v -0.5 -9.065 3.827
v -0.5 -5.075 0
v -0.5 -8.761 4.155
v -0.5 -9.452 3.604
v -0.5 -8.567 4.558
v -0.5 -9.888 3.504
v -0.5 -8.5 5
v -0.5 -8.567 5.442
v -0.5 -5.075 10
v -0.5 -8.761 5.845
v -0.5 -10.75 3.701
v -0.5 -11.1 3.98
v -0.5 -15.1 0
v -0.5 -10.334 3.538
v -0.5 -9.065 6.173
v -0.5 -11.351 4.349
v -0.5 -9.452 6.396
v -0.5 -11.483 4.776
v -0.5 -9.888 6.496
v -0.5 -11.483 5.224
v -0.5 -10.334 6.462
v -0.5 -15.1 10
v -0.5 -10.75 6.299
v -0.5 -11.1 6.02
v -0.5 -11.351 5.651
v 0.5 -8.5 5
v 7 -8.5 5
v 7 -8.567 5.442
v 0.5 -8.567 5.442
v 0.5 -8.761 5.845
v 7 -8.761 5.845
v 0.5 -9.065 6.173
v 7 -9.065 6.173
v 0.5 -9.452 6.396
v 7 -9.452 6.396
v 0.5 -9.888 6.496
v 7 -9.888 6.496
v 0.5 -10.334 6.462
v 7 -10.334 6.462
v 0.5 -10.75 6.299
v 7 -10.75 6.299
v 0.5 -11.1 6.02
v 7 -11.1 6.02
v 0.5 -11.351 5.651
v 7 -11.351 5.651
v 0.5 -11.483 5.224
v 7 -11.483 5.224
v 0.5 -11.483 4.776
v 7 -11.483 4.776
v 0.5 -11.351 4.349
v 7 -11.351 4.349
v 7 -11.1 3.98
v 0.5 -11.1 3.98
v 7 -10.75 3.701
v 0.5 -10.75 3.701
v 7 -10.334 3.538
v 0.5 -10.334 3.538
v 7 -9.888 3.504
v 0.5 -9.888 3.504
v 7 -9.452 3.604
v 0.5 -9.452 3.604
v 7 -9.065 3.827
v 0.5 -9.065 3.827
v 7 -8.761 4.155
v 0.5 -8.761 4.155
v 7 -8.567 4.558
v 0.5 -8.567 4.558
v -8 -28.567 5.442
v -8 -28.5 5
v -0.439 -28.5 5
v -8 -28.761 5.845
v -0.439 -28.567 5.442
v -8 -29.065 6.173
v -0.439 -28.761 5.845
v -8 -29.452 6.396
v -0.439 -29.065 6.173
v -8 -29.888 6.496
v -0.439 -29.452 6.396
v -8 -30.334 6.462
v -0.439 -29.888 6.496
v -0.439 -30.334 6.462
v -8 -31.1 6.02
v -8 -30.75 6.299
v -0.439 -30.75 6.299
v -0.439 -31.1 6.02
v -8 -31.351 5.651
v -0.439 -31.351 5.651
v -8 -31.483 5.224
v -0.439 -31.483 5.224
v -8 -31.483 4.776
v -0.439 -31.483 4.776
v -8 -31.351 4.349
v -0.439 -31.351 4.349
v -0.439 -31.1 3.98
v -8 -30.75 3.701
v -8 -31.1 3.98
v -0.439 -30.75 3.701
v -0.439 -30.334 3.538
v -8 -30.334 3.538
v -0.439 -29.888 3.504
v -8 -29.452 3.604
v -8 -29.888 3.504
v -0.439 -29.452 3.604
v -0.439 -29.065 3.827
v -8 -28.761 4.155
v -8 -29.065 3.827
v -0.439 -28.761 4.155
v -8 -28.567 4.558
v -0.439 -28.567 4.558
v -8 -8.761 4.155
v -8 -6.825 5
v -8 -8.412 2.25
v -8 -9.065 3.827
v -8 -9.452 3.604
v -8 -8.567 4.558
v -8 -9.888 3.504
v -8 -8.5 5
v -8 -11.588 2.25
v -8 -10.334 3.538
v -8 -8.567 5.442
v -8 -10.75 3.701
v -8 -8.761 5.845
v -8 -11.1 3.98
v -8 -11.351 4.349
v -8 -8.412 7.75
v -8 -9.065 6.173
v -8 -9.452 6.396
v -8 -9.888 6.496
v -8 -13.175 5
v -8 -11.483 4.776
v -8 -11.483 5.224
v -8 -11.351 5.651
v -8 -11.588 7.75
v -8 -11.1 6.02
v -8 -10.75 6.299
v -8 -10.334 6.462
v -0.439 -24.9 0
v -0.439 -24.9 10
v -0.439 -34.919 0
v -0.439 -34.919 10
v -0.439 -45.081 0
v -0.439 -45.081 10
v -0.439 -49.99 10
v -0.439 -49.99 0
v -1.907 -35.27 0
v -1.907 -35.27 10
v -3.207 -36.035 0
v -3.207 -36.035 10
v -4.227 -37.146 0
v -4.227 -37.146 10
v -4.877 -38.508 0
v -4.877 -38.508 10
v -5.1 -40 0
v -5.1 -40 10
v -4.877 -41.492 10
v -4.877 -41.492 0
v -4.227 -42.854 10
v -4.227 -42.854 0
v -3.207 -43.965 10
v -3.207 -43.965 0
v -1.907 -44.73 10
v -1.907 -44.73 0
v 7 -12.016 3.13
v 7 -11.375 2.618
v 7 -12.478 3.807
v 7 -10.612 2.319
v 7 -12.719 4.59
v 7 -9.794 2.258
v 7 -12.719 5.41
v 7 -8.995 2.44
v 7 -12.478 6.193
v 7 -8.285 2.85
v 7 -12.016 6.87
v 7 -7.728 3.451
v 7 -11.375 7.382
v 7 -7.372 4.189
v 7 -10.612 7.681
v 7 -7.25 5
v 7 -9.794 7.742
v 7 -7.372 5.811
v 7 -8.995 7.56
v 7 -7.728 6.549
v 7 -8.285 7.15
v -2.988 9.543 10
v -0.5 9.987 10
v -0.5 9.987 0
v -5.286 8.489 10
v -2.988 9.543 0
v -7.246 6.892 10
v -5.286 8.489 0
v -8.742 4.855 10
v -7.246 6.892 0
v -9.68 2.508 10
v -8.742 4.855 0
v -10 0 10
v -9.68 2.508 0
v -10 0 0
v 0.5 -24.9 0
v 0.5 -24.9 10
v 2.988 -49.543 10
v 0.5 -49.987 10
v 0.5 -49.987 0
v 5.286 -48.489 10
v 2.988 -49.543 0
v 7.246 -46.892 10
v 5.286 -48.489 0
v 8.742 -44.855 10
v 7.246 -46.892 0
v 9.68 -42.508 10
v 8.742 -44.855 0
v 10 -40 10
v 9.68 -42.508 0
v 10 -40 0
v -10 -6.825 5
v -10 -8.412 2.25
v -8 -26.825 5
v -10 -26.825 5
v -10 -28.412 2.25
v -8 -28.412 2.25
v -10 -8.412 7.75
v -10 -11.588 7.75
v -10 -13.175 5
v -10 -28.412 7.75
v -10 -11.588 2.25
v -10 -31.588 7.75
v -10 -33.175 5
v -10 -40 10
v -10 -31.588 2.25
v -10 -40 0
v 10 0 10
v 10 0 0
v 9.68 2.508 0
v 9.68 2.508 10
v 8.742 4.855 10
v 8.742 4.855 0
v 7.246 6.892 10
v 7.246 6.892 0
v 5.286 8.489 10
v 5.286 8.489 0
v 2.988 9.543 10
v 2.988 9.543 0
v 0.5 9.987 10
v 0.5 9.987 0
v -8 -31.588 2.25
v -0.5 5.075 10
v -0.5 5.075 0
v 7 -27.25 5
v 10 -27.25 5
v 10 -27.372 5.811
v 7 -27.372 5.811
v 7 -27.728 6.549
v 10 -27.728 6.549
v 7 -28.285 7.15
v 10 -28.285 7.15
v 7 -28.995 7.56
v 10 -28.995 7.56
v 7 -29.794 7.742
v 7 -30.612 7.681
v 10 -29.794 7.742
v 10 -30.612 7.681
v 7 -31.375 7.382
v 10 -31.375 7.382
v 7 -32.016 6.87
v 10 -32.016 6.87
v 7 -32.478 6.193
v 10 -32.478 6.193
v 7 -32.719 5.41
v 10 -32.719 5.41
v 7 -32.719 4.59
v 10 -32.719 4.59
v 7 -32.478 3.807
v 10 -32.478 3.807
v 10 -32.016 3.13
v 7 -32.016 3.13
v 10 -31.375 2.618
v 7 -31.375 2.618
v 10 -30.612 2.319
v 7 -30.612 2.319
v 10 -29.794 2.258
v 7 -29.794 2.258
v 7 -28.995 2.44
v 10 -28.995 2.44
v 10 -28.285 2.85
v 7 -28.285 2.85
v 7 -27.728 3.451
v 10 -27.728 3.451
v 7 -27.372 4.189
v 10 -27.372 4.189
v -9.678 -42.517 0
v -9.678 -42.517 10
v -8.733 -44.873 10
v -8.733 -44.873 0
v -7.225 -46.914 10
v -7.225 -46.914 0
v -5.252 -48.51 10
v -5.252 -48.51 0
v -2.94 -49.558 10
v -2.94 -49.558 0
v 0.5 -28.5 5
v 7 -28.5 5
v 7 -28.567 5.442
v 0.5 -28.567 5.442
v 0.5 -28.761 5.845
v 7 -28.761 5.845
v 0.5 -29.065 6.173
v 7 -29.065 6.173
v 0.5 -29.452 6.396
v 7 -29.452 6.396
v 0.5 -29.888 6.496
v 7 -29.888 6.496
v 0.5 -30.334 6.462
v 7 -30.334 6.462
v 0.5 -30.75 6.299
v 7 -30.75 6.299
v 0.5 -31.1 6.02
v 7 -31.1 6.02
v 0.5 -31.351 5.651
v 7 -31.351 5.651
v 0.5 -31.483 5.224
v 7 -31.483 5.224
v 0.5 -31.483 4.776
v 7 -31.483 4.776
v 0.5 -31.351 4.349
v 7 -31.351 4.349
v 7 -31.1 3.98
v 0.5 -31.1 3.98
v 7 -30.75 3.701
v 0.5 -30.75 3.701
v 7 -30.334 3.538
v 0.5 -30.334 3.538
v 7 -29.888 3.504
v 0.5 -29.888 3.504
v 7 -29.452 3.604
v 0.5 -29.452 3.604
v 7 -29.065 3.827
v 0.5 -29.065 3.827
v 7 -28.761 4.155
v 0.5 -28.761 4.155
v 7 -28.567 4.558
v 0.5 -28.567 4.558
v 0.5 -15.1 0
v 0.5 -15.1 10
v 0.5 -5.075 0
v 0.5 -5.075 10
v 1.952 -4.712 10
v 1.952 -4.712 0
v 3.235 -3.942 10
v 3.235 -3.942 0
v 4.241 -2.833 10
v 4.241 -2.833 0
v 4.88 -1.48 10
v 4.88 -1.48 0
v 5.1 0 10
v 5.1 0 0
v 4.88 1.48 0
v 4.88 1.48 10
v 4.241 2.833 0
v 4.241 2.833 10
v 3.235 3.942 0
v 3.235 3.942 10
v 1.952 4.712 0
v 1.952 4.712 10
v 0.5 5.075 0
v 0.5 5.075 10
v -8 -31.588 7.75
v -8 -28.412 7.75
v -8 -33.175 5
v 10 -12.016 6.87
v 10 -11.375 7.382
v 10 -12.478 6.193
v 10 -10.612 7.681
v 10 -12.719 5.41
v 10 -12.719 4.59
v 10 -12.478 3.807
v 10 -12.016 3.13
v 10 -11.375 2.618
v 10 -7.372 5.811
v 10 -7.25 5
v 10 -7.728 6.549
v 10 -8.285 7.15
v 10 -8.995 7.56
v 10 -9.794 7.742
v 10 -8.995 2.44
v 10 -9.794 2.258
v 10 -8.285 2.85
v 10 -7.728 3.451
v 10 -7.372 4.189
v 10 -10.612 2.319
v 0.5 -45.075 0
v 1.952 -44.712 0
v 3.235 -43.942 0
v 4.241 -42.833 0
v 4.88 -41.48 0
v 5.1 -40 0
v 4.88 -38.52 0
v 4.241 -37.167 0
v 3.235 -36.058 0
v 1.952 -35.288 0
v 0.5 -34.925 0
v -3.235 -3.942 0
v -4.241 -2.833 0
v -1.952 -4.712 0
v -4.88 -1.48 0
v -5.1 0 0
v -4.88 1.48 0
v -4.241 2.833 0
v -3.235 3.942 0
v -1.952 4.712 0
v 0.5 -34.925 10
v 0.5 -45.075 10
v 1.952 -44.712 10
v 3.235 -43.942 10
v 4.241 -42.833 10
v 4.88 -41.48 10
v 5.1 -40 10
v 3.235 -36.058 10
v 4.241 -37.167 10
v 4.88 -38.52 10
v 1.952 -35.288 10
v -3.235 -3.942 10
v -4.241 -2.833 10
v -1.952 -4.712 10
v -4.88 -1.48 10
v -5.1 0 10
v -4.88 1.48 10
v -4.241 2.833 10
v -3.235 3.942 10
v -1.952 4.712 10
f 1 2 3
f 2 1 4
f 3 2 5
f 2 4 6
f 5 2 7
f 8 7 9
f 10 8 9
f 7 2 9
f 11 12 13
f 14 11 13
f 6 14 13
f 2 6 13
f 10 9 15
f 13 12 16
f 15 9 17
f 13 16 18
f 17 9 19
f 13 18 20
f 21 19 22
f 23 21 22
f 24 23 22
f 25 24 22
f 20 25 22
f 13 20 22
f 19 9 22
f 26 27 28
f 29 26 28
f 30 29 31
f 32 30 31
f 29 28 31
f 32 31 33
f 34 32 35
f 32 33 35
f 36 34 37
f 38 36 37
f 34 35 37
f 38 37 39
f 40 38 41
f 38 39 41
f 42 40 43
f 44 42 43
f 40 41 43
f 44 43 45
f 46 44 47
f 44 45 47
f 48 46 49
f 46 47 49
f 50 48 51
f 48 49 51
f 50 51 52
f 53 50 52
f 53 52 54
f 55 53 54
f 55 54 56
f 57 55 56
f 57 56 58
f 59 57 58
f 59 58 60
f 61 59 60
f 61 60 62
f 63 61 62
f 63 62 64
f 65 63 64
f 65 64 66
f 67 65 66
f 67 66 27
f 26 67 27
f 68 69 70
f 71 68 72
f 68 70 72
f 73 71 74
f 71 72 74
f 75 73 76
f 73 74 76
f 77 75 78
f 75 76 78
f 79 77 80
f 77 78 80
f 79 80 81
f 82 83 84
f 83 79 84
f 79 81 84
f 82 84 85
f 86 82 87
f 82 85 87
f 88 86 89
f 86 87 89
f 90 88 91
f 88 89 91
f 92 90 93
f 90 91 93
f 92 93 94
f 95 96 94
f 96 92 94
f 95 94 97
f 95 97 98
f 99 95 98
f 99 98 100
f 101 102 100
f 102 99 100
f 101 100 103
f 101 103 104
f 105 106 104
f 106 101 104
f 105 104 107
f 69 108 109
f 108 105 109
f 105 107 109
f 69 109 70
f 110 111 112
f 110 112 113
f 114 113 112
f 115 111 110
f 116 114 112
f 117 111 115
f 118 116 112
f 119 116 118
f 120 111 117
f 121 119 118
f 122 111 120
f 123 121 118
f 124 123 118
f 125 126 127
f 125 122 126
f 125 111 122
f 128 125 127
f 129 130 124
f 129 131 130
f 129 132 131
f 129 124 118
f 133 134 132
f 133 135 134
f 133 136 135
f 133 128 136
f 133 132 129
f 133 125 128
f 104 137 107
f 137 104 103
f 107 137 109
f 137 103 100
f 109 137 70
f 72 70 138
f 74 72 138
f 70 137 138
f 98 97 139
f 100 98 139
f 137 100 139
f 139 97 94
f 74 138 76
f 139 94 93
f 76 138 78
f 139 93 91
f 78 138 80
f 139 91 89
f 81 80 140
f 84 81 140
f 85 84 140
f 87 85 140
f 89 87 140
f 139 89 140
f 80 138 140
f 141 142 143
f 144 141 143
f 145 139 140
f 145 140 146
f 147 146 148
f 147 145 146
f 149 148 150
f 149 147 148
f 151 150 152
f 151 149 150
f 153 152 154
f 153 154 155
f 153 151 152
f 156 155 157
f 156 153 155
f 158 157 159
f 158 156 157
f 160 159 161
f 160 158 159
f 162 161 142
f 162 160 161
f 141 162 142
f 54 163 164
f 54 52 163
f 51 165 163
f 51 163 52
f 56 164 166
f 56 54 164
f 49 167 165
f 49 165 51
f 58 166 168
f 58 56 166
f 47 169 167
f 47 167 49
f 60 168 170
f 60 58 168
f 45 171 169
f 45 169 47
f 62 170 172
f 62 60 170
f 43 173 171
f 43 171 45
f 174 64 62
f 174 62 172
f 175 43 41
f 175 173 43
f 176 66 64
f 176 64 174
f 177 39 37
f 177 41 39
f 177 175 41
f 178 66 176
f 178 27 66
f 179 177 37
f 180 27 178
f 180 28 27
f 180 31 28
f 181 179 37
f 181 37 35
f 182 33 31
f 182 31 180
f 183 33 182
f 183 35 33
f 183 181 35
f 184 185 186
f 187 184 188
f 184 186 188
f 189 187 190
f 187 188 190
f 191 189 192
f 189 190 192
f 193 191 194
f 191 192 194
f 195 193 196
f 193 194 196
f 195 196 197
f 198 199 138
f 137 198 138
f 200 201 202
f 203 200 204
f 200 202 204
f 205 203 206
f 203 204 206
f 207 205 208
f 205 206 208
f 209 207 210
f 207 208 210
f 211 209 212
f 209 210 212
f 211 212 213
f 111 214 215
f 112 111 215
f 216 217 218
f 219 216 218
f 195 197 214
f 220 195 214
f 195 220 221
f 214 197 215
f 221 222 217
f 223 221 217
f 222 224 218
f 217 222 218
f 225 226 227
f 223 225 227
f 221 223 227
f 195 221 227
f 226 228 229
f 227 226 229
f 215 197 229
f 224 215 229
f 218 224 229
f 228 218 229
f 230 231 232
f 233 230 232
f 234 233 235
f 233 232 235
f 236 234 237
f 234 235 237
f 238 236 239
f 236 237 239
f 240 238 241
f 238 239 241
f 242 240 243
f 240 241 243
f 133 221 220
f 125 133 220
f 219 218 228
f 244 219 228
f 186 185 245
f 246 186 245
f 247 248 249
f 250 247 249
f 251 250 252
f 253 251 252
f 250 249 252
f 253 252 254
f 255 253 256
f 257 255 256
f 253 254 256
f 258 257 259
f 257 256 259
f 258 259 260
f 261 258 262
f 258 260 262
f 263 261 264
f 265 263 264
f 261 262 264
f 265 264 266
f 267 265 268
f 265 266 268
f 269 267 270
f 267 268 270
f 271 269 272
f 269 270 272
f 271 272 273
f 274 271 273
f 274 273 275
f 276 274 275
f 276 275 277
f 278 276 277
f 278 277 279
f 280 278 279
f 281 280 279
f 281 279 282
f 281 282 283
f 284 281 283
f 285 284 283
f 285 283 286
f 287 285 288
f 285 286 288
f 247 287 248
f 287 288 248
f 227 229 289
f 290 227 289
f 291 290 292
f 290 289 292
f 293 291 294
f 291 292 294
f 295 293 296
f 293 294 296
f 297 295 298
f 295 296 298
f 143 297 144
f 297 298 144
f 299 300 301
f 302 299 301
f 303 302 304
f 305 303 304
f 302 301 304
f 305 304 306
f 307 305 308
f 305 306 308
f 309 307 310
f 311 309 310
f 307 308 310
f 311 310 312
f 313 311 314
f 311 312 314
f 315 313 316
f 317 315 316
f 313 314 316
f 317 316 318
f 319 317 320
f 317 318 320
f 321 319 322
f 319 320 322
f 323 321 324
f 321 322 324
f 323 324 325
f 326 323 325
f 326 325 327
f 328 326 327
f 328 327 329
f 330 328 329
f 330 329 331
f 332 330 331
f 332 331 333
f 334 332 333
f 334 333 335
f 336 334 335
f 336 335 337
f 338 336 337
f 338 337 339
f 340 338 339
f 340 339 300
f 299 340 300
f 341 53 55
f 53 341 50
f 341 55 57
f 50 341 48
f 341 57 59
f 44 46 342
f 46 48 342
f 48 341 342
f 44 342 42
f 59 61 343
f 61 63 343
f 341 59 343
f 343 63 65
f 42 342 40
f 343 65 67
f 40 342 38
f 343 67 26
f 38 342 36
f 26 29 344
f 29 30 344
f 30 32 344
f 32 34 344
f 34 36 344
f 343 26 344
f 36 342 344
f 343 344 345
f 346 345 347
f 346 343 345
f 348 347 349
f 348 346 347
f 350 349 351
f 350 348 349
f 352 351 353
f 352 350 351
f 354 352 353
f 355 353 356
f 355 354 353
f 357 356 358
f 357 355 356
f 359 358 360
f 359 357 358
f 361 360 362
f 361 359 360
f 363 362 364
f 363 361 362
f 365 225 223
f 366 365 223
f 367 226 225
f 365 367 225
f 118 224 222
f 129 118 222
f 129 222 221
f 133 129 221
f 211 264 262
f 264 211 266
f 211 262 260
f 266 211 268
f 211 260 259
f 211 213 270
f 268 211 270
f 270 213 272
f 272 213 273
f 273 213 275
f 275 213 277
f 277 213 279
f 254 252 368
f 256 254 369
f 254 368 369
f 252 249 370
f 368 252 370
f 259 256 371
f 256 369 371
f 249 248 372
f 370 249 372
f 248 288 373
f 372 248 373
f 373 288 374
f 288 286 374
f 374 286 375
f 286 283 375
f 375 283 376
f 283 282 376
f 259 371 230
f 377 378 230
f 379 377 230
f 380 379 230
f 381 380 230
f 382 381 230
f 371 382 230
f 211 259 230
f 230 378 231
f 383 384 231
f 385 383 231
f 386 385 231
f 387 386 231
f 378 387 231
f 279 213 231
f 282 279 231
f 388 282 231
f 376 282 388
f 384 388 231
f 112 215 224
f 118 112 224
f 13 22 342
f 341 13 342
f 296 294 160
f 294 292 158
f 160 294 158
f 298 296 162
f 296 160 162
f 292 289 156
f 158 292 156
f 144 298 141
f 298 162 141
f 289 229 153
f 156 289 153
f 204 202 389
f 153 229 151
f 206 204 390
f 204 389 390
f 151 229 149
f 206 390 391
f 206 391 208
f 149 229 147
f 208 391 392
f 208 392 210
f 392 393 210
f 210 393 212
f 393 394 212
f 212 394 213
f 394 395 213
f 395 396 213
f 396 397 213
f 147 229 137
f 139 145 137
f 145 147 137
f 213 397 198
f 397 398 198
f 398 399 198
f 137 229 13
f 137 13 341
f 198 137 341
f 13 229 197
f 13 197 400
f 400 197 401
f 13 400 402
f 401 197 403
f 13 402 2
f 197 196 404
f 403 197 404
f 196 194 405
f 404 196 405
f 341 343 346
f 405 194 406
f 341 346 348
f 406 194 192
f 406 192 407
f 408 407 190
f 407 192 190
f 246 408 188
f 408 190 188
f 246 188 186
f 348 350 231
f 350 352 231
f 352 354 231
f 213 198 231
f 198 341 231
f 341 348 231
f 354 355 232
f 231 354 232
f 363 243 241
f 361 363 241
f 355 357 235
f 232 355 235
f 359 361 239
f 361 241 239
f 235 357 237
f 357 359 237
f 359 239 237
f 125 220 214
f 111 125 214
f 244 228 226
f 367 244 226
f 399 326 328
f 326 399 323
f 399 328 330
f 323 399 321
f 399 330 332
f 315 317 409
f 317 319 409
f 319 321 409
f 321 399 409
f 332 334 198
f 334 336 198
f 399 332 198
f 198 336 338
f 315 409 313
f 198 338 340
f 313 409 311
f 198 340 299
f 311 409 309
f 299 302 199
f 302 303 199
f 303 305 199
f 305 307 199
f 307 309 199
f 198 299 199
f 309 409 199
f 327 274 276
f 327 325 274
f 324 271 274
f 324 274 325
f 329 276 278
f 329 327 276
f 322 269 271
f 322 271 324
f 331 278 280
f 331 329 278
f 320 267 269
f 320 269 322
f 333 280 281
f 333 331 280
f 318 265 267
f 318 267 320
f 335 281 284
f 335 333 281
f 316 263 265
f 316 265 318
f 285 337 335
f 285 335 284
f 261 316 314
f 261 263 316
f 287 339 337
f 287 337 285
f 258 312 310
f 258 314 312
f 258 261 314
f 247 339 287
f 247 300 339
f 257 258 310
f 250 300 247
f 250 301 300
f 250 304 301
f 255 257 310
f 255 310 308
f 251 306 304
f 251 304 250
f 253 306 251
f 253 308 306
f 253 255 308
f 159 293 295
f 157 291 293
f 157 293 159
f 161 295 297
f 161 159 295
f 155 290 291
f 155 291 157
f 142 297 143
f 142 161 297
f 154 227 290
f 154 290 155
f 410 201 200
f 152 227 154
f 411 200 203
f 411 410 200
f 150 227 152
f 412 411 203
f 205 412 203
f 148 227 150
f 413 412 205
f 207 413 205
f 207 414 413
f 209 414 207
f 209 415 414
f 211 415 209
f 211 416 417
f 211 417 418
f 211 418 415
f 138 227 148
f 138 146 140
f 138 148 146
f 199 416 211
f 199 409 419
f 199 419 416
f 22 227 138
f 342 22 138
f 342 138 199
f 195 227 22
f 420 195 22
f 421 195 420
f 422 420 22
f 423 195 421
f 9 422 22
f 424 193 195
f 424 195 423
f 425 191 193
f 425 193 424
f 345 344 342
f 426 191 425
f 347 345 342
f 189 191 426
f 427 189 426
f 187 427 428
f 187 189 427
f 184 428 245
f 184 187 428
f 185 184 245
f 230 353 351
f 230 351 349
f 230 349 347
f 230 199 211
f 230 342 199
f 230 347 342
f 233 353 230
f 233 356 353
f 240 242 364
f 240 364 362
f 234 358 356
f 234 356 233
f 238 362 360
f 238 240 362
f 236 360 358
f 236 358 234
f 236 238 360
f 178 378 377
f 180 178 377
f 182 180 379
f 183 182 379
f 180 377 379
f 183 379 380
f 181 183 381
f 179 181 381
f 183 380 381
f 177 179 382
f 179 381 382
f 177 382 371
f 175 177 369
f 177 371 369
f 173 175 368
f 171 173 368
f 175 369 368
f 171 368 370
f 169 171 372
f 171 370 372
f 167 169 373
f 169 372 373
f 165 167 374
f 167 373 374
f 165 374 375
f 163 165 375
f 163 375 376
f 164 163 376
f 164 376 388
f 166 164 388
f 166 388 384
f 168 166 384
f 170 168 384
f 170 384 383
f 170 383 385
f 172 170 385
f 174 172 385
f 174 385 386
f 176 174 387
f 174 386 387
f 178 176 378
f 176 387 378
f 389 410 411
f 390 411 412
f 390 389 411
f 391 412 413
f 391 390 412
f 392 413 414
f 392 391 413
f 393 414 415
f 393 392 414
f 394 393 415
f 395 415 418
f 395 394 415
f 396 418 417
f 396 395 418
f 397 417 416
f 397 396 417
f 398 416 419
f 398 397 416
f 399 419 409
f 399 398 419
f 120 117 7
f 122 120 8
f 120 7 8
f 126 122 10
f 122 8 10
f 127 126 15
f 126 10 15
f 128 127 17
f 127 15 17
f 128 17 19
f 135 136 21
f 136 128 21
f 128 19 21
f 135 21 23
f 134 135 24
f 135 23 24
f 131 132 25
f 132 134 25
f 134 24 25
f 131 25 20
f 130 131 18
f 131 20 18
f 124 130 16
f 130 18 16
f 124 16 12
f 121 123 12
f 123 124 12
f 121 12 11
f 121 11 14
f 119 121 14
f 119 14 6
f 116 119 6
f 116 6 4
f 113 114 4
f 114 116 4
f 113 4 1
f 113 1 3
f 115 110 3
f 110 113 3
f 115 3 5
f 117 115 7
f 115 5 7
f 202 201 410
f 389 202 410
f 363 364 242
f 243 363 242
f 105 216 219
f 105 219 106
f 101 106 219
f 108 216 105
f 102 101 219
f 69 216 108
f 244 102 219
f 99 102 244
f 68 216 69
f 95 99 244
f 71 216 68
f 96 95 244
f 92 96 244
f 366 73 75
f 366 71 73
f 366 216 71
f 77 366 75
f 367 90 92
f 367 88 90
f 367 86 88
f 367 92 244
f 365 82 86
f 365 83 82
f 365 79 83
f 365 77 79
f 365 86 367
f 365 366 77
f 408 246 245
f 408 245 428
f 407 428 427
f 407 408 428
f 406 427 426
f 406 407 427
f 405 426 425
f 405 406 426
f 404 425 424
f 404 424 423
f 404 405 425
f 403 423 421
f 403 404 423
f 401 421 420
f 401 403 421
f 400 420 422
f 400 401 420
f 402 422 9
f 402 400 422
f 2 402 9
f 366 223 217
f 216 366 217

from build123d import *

# Parameters (mm, degrees)
F0_R     = 5.1
F1_DEPTH = 10
F2_R     = 1.5
F3_DEPTH = 25
F5_DEPTH = 25
F6_R     = 2.75
F6_R_2   = 1.5
F7_DEPTH = 3
F8_R     = 1.5
F9_DEPTH = 2


# Not quite as in the source:
# - a feature names something its author has since deleted; it is built from what else it names


with BuildPart() as f1:
    # F0 (on Top) → F1 (new body)
    with BuildSketch(Plane.XY):
        with BuildLine():
            ThreePointArc((-10, 0), (0, -10), (10, 0))
            ThreePointArc((10, 0), (0, 10), (-10, 0))
        make_face()
        Circle(F0_R, mode=Mode.SUBTRACT)
        with BuildLine():
            Line((10, -40), (10, 0))
            ThreePointArc((10, 0), (0, -10), (-10, 0))
            Line((-10, 0), (-10, -40))
            ThreePointArc((-10, -40), (0, -30), (10, -40))
        make_face()
        with BuildLine():
            ThreePointArc((-10, -40), (0, -50), (10, -40))
            ThreePointArc((10, -40), (0, -30), (-10, -40))
        make_face()
        with Locations((0, -40)):
            Circle(F0_R, mode=Mode.SUBTRACT)
    extrude(amount=F1_DEPTH)

    # F2 (on face) → F3 (cut)
    with BuildSketch(Plane.YZ.offset(10)):
        with Locations((-30, 5)):
            Circle(F2_R)
        with Locations((-10, 5)):
            Circle(F2_R)
    extrude(amount=-F3_DEPTH, mode=Mode.SUBTRACT)

    # F4 (on face) → F5 (cut)
    with BuildSketch(Plane.XY.offset(10)):
        with BuildLine():
            ThreePointArc((0.5, 9.9874921777), (0, 10), (-0.5, 9.9874921777))
            Line((-0.5, 9.9874921777), (-0.5, 5.0754310162))
            ThreePointArc((-0.5, 5.0754310162), (0, 5.1), (0.5, 5.0754310162))
            Line((0.5, 5.0754310162), (0.5, 9.9874921777))
        make_face()
        with BuildLine():
            ThreePointArc((0.5, -5.0754310162), (0, -5.1), (-0.5, -5.0754310162))
            Line((-0.5, -5.0754310162), (-0.5, -15.1))
            Line((-0.5, -15.1), (0.5, -15.1))
            Line((0.5, -15.1), (0.5, -5.0754310162))
        make_face()
        with BuildLine():
            Line((-0.439394009, -45.0810365975), (-0.439394009, -49.9903419814))
            ThreePointArc((-0.439394009, -49.9903419814), (0.0303364777, -49.9999539848), (0.5, -49.9874921777))
            Line((0.5, -49.9874921777), (0.5, -45.0754310162))
            ThreePointArc((0.5, -45.0754310162), (0.0304323376, -45.0999092024), (-0.439394009, -45.0810365975))
        make_face()
        with BuildLine():
            Line((-0.439394009, -24.9), (-0.439394009, -34.9189634025))
            ThreePointArc((-0.439394009, -34.9189634025), (0.0304323376, -34.9000907976), (0.5, -34.9245689838))
            Line((0.5, -34.9245689838), (0.5, -24.9))
            Line((0.5, -24.9), (-0.439394009, -24.9))
        make_face()
    extrude(amount=-F5_DEPTH, mode=Mode.SUBTRACT)

    # F6 (on face) → F7 (cut)
    with BuildSketch(Plane.YZ.offset(10)):
        with Locations((-30, 5)):
            Circle(F6_R)
        with Locations((-30, 5)):
            Circle(F6_R_2, mode=Mode.SUBTRACT)
        with Locations((-10, 5)):
            Circle(F6_R)
        with Locations((-10, 5)):
            Circle(F6_R_2, mode=Mode.SUBTRACT)
    extrude(amount=-F7_DEPTH, mode=Mode.SUBTRACT)

    # F8 (on face) → F9 (cut)
    with BuildSketch(Plane(origin=(-10, 0, 0), x_dir=(0, -1, 0), z_dir=(-1, 0, 0))):
        Polygon((8.4122867597, 2.25), (11.5877132403, 2.25), (13.1754264805, 5), (11.5877132403, 7.75), (8.4122867597, 7.75), (6.8245735195, 5), align=None)
        with Locations((10, 5)):
            Circle(F8_R, mode=Mode.SUBTRACT)
        Polygon((28.4122867597, 2.25), (31.5877132403, 2.25), (33.1754264805, 5), (31.5877132403, 7.75), (28.4122867597, 7.75), (26.8245735195, 5), align=None)
        with Locations((30, 5)):
            Circle(F8_R, mode=Mode.SUBTRACT)
    extrude(amount=-F9_DEPTH, mode=Mode.SUBTRACT)


solid = f1.part
